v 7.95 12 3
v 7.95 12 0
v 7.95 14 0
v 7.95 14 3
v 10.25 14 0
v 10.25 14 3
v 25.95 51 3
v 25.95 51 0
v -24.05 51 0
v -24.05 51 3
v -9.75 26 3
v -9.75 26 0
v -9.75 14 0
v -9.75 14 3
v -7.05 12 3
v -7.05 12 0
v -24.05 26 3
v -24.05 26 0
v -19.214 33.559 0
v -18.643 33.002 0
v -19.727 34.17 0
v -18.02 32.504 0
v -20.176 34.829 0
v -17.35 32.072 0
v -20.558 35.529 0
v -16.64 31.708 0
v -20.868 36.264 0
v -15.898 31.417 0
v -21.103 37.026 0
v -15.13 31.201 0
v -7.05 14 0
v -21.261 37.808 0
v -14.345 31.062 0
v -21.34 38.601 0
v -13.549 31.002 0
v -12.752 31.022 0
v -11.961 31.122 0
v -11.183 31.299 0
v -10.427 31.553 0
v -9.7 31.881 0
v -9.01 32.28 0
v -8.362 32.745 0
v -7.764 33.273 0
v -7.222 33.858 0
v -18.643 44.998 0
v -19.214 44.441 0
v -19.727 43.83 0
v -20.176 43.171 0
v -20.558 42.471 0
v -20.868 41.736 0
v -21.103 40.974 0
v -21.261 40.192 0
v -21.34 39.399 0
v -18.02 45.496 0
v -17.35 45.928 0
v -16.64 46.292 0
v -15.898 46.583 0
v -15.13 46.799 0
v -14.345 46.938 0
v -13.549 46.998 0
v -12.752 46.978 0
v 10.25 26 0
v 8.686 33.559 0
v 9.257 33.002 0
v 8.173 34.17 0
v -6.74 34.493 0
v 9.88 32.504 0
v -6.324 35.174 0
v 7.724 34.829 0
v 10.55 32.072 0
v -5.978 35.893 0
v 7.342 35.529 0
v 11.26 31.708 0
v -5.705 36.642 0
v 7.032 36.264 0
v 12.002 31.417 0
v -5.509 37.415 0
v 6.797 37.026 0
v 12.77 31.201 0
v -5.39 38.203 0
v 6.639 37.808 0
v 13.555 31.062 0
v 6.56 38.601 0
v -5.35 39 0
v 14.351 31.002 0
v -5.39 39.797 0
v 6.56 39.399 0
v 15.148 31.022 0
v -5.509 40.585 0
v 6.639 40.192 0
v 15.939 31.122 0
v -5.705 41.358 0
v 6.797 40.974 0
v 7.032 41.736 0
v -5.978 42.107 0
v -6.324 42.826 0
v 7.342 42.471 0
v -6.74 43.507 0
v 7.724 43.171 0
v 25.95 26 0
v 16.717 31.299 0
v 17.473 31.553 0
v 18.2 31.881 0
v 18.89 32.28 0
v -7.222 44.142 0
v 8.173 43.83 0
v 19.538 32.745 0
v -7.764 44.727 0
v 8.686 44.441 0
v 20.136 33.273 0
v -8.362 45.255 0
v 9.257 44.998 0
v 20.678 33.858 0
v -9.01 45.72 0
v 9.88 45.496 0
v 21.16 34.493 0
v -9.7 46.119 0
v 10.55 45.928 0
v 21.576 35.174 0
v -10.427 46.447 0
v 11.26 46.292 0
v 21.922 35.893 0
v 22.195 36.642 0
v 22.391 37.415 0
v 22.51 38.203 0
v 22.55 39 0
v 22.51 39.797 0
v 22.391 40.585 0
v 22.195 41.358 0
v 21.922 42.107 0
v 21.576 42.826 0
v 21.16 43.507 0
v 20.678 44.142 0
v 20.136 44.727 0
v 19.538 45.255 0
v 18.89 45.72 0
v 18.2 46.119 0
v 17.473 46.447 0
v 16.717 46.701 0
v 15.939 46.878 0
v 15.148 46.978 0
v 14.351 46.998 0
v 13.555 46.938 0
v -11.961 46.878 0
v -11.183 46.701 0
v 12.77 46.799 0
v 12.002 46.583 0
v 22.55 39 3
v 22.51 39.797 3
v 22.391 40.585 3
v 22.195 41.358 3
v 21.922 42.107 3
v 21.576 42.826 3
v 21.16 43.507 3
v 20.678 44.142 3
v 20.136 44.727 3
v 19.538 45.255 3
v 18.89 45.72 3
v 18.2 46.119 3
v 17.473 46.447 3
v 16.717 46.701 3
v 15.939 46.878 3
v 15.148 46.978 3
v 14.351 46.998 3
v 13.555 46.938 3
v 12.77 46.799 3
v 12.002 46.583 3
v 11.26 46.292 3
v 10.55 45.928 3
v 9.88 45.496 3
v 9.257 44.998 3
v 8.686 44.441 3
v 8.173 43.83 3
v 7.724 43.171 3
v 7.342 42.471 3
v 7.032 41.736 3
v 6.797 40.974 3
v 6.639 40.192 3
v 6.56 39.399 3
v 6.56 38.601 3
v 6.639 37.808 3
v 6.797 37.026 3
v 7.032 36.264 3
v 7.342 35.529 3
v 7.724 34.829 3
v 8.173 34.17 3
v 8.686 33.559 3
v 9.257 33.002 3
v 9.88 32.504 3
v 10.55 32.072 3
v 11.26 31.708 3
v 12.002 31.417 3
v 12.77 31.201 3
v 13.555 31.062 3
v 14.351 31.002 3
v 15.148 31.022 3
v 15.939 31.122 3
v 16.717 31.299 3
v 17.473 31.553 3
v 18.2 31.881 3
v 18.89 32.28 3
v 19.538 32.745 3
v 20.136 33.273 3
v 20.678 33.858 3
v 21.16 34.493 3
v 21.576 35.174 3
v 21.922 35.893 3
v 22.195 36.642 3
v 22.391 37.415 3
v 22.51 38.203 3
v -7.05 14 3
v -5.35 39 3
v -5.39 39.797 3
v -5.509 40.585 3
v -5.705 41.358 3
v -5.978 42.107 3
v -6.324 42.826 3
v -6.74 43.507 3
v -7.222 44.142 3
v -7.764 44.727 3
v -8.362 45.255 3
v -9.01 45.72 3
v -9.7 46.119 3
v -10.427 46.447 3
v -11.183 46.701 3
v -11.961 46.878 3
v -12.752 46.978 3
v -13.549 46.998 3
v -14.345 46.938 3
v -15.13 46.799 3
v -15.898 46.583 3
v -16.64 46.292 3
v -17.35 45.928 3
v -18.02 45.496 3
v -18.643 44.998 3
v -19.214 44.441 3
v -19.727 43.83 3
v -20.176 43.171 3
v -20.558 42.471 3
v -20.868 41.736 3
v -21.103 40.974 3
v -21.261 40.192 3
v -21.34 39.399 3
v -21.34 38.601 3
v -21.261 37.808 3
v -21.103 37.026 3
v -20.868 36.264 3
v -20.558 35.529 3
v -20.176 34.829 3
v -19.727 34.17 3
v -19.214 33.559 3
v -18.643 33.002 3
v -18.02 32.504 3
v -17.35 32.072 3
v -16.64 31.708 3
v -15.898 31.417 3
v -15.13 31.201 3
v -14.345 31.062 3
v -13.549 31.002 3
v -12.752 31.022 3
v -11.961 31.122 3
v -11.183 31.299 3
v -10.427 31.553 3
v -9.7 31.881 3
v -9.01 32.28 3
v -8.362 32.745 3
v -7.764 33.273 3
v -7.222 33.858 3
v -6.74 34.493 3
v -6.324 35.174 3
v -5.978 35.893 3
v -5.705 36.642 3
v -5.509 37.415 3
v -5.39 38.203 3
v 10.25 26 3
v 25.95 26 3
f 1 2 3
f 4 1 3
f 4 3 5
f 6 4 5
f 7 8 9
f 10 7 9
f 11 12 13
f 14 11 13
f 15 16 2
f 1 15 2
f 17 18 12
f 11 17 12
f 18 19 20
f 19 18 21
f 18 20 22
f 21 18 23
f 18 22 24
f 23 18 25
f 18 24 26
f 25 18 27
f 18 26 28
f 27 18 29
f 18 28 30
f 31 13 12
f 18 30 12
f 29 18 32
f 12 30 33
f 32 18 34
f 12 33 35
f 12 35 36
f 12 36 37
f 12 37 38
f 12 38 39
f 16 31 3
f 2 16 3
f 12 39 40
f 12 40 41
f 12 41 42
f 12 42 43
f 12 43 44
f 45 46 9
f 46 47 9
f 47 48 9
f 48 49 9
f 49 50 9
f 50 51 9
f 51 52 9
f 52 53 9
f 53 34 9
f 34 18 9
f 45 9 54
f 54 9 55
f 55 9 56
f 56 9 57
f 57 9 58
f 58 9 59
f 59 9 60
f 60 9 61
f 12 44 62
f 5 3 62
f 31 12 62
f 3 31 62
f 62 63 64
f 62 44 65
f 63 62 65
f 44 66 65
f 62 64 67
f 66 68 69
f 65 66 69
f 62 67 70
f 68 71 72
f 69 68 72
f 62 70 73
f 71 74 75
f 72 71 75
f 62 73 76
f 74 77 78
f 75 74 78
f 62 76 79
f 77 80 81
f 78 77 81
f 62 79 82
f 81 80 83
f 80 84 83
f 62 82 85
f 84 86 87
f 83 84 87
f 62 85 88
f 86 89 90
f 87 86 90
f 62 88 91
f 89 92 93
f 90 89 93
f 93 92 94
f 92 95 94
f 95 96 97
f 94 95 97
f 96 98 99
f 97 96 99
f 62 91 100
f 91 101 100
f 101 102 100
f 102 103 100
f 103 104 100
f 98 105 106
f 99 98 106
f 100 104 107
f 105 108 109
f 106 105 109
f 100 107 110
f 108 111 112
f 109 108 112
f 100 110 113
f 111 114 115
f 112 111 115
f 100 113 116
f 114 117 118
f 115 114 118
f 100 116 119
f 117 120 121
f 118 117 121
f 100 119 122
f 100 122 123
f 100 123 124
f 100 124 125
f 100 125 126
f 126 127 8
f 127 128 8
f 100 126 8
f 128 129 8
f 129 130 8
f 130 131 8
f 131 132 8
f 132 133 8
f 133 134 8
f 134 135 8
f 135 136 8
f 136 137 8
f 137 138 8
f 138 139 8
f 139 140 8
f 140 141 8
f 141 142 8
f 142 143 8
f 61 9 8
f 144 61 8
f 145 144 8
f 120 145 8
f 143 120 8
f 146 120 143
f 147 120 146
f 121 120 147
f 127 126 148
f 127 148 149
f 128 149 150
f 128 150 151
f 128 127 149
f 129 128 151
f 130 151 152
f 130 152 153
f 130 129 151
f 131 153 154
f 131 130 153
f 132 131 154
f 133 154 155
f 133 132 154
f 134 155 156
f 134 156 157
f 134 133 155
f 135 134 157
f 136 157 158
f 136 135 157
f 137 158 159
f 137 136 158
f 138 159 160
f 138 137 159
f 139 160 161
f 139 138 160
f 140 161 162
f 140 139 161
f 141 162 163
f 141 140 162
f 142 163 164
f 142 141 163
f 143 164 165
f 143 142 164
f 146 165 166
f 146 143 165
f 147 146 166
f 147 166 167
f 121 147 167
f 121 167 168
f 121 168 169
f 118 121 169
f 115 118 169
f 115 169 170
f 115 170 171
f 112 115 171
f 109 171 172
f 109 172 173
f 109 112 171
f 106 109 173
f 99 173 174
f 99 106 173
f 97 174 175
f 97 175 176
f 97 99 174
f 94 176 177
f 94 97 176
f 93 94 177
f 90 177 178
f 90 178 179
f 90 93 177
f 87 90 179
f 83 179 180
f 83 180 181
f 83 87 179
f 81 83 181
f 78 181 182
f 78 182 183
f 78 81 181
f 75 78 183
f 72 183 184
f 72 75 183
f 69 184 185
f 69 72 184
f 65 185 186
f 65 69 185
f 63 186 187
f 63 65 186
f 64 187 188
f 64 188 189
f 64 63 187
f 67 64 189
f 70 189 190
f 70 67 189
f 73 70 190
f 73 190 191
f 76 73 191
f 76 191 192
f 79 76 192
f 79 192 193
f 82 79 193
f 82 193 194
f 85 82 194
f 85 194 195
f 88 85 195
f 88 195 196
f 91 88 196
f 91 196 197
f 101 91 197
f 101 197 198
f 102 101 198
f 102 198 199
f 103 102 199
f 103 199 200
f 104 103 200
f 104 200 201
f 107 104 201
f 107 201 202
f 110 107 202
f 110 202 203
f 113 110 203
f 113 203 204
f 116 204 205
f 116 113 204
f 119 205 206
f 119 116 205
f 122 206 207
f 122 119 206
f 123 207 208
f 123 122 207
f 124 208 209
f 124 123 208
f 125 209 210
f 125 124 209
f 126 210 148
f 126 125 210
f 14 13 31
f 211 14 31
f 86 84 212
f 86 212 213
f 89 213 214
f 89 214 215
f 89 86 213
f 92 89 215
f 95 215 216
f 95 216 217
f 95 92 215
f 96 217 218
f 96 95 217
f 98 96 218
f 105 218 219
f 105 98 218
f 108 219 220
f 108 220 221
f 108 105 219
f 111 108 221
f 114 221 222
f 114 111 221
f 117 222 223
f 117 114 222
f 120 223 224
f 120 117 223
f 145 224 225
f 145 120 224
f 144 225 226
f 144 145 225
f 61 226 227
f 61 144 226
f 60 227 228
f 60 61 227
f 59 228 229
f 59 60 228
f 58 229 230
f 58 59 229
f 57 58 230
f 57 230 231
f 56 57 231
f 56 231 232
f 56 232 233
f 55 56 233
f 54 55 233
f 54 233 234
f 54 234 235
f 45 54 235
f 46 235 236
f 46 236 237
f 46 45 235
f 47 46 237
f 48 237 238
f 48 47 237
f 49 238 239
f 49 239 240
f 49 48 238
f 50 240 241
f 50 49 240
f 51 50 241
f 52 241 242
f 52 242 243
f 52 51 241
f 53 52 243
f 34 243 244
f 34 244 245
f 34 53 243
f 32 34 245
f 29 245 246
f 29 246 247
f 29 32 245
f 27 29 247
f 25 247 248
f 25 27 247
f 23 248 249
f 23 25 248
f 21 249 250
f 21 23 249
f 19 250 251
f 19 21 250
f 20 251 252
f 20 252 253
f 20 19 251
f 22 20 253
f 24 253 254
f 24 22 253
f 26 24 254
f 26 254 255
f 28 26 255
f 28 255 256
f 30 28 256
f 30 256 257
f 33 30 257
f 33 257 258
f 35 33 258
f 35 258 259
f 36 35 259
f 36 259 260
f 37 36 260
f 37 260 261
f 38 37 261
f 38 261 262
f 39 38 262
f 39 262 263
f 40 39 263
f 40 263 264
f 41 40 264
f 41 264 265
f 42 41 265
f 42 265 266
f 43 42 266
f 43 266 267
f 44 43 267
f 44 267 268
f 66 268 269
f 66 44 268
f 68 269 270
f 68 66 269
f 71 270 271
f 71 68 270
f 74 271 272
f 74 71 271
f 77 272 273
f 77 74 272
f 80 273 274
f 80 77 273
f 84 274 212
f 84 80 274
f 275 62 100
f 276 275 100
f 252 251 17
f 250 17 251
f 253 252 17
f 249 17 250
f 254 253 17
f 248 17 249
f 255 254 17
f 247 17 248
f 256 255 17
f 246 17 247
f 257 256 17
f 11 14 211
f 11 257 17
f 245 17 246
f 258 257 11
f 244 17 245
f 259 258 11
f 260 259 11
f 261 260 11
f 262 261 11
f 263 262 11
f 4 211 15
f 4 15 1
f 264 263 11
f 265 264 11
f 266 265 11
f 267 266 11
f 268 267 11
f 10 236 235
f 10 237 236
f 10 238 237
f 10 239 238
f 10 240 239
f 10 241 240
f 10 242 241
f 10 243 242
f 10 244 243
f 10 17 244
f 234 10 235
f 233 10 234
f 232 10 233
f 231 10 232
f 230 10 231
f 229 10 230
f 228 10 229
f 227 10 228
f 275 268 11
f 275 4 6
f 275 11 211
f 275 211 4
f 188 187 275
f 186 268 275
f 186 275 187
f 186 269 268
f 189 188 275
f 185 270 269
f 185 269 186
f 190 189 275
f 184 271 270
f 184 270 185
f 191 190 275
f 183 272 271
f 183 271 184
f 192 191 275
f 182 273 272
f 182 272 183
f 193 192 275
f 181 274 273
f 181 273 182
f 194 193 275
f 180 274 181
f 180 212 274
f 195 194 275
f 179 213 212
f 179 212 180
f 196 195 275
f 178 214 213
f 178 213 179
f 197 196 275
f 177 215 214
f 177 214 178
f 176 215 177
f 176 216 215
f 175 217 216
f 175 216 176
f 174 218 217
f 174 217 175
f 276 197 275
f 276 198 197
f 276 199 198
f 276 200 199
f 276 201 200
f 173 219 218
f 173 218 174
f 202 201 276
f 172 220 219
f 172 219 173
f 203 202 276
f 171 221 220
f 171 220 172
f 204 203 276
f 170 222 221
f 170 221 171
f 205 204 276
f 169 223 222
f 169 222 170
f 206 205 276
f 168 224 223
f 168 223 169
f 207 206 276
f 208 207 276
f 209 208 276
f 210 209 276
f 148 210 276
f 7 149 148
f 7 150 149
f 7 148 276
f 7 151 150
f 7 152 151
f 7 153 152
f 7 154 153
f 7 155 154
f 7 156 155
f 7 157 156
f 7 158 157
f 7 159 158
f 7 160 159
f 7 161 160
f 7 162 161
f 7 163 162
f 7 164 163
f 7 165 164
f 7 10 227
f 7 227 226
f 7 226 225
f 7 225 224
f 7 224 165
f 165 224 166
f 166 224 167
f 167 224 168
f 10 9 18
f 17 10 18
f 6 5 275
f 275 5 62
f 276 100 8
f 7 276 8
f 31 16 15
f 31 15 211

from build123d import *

# Parameters (mm, degrees)
F0_R     = 8
F0_W     = 15
F0_H     = 2
F1_DEPTH = 3


with BuildPart() as f1:
    # F0 (on Top) → F1 (new body)
    with BuildSketch(Plane.XY):
        Polygon((25.950002, 51.000001), (-24.049998, 51.000001), (-24.049998, 26.000001), (-9.75, 26.000001), (10.25, 26.000001), (25.950002, 26.000001), align=None)
        with Locations((-13.35, 39.000001)):
            Circle(F0_R, mode=Mode.SUBTRACT)
        with Locations((14.549999, 39.000001)):
            Circle(F0_R, mode=Mode.SUBTRACT)
        Polygon((10.25, 26.000001), (-9.75, 26.000001), (-9.75, 14.000001), (-7.05, 14.000001), (7.95, 14.000001), (10.25, 14.000001), align=None)
        with Locations((0.45, 13.000001)):
            Rectangle(F0_W, F0_H)
    extrude(amount=F1_DEPTH)


solid = f1.part
